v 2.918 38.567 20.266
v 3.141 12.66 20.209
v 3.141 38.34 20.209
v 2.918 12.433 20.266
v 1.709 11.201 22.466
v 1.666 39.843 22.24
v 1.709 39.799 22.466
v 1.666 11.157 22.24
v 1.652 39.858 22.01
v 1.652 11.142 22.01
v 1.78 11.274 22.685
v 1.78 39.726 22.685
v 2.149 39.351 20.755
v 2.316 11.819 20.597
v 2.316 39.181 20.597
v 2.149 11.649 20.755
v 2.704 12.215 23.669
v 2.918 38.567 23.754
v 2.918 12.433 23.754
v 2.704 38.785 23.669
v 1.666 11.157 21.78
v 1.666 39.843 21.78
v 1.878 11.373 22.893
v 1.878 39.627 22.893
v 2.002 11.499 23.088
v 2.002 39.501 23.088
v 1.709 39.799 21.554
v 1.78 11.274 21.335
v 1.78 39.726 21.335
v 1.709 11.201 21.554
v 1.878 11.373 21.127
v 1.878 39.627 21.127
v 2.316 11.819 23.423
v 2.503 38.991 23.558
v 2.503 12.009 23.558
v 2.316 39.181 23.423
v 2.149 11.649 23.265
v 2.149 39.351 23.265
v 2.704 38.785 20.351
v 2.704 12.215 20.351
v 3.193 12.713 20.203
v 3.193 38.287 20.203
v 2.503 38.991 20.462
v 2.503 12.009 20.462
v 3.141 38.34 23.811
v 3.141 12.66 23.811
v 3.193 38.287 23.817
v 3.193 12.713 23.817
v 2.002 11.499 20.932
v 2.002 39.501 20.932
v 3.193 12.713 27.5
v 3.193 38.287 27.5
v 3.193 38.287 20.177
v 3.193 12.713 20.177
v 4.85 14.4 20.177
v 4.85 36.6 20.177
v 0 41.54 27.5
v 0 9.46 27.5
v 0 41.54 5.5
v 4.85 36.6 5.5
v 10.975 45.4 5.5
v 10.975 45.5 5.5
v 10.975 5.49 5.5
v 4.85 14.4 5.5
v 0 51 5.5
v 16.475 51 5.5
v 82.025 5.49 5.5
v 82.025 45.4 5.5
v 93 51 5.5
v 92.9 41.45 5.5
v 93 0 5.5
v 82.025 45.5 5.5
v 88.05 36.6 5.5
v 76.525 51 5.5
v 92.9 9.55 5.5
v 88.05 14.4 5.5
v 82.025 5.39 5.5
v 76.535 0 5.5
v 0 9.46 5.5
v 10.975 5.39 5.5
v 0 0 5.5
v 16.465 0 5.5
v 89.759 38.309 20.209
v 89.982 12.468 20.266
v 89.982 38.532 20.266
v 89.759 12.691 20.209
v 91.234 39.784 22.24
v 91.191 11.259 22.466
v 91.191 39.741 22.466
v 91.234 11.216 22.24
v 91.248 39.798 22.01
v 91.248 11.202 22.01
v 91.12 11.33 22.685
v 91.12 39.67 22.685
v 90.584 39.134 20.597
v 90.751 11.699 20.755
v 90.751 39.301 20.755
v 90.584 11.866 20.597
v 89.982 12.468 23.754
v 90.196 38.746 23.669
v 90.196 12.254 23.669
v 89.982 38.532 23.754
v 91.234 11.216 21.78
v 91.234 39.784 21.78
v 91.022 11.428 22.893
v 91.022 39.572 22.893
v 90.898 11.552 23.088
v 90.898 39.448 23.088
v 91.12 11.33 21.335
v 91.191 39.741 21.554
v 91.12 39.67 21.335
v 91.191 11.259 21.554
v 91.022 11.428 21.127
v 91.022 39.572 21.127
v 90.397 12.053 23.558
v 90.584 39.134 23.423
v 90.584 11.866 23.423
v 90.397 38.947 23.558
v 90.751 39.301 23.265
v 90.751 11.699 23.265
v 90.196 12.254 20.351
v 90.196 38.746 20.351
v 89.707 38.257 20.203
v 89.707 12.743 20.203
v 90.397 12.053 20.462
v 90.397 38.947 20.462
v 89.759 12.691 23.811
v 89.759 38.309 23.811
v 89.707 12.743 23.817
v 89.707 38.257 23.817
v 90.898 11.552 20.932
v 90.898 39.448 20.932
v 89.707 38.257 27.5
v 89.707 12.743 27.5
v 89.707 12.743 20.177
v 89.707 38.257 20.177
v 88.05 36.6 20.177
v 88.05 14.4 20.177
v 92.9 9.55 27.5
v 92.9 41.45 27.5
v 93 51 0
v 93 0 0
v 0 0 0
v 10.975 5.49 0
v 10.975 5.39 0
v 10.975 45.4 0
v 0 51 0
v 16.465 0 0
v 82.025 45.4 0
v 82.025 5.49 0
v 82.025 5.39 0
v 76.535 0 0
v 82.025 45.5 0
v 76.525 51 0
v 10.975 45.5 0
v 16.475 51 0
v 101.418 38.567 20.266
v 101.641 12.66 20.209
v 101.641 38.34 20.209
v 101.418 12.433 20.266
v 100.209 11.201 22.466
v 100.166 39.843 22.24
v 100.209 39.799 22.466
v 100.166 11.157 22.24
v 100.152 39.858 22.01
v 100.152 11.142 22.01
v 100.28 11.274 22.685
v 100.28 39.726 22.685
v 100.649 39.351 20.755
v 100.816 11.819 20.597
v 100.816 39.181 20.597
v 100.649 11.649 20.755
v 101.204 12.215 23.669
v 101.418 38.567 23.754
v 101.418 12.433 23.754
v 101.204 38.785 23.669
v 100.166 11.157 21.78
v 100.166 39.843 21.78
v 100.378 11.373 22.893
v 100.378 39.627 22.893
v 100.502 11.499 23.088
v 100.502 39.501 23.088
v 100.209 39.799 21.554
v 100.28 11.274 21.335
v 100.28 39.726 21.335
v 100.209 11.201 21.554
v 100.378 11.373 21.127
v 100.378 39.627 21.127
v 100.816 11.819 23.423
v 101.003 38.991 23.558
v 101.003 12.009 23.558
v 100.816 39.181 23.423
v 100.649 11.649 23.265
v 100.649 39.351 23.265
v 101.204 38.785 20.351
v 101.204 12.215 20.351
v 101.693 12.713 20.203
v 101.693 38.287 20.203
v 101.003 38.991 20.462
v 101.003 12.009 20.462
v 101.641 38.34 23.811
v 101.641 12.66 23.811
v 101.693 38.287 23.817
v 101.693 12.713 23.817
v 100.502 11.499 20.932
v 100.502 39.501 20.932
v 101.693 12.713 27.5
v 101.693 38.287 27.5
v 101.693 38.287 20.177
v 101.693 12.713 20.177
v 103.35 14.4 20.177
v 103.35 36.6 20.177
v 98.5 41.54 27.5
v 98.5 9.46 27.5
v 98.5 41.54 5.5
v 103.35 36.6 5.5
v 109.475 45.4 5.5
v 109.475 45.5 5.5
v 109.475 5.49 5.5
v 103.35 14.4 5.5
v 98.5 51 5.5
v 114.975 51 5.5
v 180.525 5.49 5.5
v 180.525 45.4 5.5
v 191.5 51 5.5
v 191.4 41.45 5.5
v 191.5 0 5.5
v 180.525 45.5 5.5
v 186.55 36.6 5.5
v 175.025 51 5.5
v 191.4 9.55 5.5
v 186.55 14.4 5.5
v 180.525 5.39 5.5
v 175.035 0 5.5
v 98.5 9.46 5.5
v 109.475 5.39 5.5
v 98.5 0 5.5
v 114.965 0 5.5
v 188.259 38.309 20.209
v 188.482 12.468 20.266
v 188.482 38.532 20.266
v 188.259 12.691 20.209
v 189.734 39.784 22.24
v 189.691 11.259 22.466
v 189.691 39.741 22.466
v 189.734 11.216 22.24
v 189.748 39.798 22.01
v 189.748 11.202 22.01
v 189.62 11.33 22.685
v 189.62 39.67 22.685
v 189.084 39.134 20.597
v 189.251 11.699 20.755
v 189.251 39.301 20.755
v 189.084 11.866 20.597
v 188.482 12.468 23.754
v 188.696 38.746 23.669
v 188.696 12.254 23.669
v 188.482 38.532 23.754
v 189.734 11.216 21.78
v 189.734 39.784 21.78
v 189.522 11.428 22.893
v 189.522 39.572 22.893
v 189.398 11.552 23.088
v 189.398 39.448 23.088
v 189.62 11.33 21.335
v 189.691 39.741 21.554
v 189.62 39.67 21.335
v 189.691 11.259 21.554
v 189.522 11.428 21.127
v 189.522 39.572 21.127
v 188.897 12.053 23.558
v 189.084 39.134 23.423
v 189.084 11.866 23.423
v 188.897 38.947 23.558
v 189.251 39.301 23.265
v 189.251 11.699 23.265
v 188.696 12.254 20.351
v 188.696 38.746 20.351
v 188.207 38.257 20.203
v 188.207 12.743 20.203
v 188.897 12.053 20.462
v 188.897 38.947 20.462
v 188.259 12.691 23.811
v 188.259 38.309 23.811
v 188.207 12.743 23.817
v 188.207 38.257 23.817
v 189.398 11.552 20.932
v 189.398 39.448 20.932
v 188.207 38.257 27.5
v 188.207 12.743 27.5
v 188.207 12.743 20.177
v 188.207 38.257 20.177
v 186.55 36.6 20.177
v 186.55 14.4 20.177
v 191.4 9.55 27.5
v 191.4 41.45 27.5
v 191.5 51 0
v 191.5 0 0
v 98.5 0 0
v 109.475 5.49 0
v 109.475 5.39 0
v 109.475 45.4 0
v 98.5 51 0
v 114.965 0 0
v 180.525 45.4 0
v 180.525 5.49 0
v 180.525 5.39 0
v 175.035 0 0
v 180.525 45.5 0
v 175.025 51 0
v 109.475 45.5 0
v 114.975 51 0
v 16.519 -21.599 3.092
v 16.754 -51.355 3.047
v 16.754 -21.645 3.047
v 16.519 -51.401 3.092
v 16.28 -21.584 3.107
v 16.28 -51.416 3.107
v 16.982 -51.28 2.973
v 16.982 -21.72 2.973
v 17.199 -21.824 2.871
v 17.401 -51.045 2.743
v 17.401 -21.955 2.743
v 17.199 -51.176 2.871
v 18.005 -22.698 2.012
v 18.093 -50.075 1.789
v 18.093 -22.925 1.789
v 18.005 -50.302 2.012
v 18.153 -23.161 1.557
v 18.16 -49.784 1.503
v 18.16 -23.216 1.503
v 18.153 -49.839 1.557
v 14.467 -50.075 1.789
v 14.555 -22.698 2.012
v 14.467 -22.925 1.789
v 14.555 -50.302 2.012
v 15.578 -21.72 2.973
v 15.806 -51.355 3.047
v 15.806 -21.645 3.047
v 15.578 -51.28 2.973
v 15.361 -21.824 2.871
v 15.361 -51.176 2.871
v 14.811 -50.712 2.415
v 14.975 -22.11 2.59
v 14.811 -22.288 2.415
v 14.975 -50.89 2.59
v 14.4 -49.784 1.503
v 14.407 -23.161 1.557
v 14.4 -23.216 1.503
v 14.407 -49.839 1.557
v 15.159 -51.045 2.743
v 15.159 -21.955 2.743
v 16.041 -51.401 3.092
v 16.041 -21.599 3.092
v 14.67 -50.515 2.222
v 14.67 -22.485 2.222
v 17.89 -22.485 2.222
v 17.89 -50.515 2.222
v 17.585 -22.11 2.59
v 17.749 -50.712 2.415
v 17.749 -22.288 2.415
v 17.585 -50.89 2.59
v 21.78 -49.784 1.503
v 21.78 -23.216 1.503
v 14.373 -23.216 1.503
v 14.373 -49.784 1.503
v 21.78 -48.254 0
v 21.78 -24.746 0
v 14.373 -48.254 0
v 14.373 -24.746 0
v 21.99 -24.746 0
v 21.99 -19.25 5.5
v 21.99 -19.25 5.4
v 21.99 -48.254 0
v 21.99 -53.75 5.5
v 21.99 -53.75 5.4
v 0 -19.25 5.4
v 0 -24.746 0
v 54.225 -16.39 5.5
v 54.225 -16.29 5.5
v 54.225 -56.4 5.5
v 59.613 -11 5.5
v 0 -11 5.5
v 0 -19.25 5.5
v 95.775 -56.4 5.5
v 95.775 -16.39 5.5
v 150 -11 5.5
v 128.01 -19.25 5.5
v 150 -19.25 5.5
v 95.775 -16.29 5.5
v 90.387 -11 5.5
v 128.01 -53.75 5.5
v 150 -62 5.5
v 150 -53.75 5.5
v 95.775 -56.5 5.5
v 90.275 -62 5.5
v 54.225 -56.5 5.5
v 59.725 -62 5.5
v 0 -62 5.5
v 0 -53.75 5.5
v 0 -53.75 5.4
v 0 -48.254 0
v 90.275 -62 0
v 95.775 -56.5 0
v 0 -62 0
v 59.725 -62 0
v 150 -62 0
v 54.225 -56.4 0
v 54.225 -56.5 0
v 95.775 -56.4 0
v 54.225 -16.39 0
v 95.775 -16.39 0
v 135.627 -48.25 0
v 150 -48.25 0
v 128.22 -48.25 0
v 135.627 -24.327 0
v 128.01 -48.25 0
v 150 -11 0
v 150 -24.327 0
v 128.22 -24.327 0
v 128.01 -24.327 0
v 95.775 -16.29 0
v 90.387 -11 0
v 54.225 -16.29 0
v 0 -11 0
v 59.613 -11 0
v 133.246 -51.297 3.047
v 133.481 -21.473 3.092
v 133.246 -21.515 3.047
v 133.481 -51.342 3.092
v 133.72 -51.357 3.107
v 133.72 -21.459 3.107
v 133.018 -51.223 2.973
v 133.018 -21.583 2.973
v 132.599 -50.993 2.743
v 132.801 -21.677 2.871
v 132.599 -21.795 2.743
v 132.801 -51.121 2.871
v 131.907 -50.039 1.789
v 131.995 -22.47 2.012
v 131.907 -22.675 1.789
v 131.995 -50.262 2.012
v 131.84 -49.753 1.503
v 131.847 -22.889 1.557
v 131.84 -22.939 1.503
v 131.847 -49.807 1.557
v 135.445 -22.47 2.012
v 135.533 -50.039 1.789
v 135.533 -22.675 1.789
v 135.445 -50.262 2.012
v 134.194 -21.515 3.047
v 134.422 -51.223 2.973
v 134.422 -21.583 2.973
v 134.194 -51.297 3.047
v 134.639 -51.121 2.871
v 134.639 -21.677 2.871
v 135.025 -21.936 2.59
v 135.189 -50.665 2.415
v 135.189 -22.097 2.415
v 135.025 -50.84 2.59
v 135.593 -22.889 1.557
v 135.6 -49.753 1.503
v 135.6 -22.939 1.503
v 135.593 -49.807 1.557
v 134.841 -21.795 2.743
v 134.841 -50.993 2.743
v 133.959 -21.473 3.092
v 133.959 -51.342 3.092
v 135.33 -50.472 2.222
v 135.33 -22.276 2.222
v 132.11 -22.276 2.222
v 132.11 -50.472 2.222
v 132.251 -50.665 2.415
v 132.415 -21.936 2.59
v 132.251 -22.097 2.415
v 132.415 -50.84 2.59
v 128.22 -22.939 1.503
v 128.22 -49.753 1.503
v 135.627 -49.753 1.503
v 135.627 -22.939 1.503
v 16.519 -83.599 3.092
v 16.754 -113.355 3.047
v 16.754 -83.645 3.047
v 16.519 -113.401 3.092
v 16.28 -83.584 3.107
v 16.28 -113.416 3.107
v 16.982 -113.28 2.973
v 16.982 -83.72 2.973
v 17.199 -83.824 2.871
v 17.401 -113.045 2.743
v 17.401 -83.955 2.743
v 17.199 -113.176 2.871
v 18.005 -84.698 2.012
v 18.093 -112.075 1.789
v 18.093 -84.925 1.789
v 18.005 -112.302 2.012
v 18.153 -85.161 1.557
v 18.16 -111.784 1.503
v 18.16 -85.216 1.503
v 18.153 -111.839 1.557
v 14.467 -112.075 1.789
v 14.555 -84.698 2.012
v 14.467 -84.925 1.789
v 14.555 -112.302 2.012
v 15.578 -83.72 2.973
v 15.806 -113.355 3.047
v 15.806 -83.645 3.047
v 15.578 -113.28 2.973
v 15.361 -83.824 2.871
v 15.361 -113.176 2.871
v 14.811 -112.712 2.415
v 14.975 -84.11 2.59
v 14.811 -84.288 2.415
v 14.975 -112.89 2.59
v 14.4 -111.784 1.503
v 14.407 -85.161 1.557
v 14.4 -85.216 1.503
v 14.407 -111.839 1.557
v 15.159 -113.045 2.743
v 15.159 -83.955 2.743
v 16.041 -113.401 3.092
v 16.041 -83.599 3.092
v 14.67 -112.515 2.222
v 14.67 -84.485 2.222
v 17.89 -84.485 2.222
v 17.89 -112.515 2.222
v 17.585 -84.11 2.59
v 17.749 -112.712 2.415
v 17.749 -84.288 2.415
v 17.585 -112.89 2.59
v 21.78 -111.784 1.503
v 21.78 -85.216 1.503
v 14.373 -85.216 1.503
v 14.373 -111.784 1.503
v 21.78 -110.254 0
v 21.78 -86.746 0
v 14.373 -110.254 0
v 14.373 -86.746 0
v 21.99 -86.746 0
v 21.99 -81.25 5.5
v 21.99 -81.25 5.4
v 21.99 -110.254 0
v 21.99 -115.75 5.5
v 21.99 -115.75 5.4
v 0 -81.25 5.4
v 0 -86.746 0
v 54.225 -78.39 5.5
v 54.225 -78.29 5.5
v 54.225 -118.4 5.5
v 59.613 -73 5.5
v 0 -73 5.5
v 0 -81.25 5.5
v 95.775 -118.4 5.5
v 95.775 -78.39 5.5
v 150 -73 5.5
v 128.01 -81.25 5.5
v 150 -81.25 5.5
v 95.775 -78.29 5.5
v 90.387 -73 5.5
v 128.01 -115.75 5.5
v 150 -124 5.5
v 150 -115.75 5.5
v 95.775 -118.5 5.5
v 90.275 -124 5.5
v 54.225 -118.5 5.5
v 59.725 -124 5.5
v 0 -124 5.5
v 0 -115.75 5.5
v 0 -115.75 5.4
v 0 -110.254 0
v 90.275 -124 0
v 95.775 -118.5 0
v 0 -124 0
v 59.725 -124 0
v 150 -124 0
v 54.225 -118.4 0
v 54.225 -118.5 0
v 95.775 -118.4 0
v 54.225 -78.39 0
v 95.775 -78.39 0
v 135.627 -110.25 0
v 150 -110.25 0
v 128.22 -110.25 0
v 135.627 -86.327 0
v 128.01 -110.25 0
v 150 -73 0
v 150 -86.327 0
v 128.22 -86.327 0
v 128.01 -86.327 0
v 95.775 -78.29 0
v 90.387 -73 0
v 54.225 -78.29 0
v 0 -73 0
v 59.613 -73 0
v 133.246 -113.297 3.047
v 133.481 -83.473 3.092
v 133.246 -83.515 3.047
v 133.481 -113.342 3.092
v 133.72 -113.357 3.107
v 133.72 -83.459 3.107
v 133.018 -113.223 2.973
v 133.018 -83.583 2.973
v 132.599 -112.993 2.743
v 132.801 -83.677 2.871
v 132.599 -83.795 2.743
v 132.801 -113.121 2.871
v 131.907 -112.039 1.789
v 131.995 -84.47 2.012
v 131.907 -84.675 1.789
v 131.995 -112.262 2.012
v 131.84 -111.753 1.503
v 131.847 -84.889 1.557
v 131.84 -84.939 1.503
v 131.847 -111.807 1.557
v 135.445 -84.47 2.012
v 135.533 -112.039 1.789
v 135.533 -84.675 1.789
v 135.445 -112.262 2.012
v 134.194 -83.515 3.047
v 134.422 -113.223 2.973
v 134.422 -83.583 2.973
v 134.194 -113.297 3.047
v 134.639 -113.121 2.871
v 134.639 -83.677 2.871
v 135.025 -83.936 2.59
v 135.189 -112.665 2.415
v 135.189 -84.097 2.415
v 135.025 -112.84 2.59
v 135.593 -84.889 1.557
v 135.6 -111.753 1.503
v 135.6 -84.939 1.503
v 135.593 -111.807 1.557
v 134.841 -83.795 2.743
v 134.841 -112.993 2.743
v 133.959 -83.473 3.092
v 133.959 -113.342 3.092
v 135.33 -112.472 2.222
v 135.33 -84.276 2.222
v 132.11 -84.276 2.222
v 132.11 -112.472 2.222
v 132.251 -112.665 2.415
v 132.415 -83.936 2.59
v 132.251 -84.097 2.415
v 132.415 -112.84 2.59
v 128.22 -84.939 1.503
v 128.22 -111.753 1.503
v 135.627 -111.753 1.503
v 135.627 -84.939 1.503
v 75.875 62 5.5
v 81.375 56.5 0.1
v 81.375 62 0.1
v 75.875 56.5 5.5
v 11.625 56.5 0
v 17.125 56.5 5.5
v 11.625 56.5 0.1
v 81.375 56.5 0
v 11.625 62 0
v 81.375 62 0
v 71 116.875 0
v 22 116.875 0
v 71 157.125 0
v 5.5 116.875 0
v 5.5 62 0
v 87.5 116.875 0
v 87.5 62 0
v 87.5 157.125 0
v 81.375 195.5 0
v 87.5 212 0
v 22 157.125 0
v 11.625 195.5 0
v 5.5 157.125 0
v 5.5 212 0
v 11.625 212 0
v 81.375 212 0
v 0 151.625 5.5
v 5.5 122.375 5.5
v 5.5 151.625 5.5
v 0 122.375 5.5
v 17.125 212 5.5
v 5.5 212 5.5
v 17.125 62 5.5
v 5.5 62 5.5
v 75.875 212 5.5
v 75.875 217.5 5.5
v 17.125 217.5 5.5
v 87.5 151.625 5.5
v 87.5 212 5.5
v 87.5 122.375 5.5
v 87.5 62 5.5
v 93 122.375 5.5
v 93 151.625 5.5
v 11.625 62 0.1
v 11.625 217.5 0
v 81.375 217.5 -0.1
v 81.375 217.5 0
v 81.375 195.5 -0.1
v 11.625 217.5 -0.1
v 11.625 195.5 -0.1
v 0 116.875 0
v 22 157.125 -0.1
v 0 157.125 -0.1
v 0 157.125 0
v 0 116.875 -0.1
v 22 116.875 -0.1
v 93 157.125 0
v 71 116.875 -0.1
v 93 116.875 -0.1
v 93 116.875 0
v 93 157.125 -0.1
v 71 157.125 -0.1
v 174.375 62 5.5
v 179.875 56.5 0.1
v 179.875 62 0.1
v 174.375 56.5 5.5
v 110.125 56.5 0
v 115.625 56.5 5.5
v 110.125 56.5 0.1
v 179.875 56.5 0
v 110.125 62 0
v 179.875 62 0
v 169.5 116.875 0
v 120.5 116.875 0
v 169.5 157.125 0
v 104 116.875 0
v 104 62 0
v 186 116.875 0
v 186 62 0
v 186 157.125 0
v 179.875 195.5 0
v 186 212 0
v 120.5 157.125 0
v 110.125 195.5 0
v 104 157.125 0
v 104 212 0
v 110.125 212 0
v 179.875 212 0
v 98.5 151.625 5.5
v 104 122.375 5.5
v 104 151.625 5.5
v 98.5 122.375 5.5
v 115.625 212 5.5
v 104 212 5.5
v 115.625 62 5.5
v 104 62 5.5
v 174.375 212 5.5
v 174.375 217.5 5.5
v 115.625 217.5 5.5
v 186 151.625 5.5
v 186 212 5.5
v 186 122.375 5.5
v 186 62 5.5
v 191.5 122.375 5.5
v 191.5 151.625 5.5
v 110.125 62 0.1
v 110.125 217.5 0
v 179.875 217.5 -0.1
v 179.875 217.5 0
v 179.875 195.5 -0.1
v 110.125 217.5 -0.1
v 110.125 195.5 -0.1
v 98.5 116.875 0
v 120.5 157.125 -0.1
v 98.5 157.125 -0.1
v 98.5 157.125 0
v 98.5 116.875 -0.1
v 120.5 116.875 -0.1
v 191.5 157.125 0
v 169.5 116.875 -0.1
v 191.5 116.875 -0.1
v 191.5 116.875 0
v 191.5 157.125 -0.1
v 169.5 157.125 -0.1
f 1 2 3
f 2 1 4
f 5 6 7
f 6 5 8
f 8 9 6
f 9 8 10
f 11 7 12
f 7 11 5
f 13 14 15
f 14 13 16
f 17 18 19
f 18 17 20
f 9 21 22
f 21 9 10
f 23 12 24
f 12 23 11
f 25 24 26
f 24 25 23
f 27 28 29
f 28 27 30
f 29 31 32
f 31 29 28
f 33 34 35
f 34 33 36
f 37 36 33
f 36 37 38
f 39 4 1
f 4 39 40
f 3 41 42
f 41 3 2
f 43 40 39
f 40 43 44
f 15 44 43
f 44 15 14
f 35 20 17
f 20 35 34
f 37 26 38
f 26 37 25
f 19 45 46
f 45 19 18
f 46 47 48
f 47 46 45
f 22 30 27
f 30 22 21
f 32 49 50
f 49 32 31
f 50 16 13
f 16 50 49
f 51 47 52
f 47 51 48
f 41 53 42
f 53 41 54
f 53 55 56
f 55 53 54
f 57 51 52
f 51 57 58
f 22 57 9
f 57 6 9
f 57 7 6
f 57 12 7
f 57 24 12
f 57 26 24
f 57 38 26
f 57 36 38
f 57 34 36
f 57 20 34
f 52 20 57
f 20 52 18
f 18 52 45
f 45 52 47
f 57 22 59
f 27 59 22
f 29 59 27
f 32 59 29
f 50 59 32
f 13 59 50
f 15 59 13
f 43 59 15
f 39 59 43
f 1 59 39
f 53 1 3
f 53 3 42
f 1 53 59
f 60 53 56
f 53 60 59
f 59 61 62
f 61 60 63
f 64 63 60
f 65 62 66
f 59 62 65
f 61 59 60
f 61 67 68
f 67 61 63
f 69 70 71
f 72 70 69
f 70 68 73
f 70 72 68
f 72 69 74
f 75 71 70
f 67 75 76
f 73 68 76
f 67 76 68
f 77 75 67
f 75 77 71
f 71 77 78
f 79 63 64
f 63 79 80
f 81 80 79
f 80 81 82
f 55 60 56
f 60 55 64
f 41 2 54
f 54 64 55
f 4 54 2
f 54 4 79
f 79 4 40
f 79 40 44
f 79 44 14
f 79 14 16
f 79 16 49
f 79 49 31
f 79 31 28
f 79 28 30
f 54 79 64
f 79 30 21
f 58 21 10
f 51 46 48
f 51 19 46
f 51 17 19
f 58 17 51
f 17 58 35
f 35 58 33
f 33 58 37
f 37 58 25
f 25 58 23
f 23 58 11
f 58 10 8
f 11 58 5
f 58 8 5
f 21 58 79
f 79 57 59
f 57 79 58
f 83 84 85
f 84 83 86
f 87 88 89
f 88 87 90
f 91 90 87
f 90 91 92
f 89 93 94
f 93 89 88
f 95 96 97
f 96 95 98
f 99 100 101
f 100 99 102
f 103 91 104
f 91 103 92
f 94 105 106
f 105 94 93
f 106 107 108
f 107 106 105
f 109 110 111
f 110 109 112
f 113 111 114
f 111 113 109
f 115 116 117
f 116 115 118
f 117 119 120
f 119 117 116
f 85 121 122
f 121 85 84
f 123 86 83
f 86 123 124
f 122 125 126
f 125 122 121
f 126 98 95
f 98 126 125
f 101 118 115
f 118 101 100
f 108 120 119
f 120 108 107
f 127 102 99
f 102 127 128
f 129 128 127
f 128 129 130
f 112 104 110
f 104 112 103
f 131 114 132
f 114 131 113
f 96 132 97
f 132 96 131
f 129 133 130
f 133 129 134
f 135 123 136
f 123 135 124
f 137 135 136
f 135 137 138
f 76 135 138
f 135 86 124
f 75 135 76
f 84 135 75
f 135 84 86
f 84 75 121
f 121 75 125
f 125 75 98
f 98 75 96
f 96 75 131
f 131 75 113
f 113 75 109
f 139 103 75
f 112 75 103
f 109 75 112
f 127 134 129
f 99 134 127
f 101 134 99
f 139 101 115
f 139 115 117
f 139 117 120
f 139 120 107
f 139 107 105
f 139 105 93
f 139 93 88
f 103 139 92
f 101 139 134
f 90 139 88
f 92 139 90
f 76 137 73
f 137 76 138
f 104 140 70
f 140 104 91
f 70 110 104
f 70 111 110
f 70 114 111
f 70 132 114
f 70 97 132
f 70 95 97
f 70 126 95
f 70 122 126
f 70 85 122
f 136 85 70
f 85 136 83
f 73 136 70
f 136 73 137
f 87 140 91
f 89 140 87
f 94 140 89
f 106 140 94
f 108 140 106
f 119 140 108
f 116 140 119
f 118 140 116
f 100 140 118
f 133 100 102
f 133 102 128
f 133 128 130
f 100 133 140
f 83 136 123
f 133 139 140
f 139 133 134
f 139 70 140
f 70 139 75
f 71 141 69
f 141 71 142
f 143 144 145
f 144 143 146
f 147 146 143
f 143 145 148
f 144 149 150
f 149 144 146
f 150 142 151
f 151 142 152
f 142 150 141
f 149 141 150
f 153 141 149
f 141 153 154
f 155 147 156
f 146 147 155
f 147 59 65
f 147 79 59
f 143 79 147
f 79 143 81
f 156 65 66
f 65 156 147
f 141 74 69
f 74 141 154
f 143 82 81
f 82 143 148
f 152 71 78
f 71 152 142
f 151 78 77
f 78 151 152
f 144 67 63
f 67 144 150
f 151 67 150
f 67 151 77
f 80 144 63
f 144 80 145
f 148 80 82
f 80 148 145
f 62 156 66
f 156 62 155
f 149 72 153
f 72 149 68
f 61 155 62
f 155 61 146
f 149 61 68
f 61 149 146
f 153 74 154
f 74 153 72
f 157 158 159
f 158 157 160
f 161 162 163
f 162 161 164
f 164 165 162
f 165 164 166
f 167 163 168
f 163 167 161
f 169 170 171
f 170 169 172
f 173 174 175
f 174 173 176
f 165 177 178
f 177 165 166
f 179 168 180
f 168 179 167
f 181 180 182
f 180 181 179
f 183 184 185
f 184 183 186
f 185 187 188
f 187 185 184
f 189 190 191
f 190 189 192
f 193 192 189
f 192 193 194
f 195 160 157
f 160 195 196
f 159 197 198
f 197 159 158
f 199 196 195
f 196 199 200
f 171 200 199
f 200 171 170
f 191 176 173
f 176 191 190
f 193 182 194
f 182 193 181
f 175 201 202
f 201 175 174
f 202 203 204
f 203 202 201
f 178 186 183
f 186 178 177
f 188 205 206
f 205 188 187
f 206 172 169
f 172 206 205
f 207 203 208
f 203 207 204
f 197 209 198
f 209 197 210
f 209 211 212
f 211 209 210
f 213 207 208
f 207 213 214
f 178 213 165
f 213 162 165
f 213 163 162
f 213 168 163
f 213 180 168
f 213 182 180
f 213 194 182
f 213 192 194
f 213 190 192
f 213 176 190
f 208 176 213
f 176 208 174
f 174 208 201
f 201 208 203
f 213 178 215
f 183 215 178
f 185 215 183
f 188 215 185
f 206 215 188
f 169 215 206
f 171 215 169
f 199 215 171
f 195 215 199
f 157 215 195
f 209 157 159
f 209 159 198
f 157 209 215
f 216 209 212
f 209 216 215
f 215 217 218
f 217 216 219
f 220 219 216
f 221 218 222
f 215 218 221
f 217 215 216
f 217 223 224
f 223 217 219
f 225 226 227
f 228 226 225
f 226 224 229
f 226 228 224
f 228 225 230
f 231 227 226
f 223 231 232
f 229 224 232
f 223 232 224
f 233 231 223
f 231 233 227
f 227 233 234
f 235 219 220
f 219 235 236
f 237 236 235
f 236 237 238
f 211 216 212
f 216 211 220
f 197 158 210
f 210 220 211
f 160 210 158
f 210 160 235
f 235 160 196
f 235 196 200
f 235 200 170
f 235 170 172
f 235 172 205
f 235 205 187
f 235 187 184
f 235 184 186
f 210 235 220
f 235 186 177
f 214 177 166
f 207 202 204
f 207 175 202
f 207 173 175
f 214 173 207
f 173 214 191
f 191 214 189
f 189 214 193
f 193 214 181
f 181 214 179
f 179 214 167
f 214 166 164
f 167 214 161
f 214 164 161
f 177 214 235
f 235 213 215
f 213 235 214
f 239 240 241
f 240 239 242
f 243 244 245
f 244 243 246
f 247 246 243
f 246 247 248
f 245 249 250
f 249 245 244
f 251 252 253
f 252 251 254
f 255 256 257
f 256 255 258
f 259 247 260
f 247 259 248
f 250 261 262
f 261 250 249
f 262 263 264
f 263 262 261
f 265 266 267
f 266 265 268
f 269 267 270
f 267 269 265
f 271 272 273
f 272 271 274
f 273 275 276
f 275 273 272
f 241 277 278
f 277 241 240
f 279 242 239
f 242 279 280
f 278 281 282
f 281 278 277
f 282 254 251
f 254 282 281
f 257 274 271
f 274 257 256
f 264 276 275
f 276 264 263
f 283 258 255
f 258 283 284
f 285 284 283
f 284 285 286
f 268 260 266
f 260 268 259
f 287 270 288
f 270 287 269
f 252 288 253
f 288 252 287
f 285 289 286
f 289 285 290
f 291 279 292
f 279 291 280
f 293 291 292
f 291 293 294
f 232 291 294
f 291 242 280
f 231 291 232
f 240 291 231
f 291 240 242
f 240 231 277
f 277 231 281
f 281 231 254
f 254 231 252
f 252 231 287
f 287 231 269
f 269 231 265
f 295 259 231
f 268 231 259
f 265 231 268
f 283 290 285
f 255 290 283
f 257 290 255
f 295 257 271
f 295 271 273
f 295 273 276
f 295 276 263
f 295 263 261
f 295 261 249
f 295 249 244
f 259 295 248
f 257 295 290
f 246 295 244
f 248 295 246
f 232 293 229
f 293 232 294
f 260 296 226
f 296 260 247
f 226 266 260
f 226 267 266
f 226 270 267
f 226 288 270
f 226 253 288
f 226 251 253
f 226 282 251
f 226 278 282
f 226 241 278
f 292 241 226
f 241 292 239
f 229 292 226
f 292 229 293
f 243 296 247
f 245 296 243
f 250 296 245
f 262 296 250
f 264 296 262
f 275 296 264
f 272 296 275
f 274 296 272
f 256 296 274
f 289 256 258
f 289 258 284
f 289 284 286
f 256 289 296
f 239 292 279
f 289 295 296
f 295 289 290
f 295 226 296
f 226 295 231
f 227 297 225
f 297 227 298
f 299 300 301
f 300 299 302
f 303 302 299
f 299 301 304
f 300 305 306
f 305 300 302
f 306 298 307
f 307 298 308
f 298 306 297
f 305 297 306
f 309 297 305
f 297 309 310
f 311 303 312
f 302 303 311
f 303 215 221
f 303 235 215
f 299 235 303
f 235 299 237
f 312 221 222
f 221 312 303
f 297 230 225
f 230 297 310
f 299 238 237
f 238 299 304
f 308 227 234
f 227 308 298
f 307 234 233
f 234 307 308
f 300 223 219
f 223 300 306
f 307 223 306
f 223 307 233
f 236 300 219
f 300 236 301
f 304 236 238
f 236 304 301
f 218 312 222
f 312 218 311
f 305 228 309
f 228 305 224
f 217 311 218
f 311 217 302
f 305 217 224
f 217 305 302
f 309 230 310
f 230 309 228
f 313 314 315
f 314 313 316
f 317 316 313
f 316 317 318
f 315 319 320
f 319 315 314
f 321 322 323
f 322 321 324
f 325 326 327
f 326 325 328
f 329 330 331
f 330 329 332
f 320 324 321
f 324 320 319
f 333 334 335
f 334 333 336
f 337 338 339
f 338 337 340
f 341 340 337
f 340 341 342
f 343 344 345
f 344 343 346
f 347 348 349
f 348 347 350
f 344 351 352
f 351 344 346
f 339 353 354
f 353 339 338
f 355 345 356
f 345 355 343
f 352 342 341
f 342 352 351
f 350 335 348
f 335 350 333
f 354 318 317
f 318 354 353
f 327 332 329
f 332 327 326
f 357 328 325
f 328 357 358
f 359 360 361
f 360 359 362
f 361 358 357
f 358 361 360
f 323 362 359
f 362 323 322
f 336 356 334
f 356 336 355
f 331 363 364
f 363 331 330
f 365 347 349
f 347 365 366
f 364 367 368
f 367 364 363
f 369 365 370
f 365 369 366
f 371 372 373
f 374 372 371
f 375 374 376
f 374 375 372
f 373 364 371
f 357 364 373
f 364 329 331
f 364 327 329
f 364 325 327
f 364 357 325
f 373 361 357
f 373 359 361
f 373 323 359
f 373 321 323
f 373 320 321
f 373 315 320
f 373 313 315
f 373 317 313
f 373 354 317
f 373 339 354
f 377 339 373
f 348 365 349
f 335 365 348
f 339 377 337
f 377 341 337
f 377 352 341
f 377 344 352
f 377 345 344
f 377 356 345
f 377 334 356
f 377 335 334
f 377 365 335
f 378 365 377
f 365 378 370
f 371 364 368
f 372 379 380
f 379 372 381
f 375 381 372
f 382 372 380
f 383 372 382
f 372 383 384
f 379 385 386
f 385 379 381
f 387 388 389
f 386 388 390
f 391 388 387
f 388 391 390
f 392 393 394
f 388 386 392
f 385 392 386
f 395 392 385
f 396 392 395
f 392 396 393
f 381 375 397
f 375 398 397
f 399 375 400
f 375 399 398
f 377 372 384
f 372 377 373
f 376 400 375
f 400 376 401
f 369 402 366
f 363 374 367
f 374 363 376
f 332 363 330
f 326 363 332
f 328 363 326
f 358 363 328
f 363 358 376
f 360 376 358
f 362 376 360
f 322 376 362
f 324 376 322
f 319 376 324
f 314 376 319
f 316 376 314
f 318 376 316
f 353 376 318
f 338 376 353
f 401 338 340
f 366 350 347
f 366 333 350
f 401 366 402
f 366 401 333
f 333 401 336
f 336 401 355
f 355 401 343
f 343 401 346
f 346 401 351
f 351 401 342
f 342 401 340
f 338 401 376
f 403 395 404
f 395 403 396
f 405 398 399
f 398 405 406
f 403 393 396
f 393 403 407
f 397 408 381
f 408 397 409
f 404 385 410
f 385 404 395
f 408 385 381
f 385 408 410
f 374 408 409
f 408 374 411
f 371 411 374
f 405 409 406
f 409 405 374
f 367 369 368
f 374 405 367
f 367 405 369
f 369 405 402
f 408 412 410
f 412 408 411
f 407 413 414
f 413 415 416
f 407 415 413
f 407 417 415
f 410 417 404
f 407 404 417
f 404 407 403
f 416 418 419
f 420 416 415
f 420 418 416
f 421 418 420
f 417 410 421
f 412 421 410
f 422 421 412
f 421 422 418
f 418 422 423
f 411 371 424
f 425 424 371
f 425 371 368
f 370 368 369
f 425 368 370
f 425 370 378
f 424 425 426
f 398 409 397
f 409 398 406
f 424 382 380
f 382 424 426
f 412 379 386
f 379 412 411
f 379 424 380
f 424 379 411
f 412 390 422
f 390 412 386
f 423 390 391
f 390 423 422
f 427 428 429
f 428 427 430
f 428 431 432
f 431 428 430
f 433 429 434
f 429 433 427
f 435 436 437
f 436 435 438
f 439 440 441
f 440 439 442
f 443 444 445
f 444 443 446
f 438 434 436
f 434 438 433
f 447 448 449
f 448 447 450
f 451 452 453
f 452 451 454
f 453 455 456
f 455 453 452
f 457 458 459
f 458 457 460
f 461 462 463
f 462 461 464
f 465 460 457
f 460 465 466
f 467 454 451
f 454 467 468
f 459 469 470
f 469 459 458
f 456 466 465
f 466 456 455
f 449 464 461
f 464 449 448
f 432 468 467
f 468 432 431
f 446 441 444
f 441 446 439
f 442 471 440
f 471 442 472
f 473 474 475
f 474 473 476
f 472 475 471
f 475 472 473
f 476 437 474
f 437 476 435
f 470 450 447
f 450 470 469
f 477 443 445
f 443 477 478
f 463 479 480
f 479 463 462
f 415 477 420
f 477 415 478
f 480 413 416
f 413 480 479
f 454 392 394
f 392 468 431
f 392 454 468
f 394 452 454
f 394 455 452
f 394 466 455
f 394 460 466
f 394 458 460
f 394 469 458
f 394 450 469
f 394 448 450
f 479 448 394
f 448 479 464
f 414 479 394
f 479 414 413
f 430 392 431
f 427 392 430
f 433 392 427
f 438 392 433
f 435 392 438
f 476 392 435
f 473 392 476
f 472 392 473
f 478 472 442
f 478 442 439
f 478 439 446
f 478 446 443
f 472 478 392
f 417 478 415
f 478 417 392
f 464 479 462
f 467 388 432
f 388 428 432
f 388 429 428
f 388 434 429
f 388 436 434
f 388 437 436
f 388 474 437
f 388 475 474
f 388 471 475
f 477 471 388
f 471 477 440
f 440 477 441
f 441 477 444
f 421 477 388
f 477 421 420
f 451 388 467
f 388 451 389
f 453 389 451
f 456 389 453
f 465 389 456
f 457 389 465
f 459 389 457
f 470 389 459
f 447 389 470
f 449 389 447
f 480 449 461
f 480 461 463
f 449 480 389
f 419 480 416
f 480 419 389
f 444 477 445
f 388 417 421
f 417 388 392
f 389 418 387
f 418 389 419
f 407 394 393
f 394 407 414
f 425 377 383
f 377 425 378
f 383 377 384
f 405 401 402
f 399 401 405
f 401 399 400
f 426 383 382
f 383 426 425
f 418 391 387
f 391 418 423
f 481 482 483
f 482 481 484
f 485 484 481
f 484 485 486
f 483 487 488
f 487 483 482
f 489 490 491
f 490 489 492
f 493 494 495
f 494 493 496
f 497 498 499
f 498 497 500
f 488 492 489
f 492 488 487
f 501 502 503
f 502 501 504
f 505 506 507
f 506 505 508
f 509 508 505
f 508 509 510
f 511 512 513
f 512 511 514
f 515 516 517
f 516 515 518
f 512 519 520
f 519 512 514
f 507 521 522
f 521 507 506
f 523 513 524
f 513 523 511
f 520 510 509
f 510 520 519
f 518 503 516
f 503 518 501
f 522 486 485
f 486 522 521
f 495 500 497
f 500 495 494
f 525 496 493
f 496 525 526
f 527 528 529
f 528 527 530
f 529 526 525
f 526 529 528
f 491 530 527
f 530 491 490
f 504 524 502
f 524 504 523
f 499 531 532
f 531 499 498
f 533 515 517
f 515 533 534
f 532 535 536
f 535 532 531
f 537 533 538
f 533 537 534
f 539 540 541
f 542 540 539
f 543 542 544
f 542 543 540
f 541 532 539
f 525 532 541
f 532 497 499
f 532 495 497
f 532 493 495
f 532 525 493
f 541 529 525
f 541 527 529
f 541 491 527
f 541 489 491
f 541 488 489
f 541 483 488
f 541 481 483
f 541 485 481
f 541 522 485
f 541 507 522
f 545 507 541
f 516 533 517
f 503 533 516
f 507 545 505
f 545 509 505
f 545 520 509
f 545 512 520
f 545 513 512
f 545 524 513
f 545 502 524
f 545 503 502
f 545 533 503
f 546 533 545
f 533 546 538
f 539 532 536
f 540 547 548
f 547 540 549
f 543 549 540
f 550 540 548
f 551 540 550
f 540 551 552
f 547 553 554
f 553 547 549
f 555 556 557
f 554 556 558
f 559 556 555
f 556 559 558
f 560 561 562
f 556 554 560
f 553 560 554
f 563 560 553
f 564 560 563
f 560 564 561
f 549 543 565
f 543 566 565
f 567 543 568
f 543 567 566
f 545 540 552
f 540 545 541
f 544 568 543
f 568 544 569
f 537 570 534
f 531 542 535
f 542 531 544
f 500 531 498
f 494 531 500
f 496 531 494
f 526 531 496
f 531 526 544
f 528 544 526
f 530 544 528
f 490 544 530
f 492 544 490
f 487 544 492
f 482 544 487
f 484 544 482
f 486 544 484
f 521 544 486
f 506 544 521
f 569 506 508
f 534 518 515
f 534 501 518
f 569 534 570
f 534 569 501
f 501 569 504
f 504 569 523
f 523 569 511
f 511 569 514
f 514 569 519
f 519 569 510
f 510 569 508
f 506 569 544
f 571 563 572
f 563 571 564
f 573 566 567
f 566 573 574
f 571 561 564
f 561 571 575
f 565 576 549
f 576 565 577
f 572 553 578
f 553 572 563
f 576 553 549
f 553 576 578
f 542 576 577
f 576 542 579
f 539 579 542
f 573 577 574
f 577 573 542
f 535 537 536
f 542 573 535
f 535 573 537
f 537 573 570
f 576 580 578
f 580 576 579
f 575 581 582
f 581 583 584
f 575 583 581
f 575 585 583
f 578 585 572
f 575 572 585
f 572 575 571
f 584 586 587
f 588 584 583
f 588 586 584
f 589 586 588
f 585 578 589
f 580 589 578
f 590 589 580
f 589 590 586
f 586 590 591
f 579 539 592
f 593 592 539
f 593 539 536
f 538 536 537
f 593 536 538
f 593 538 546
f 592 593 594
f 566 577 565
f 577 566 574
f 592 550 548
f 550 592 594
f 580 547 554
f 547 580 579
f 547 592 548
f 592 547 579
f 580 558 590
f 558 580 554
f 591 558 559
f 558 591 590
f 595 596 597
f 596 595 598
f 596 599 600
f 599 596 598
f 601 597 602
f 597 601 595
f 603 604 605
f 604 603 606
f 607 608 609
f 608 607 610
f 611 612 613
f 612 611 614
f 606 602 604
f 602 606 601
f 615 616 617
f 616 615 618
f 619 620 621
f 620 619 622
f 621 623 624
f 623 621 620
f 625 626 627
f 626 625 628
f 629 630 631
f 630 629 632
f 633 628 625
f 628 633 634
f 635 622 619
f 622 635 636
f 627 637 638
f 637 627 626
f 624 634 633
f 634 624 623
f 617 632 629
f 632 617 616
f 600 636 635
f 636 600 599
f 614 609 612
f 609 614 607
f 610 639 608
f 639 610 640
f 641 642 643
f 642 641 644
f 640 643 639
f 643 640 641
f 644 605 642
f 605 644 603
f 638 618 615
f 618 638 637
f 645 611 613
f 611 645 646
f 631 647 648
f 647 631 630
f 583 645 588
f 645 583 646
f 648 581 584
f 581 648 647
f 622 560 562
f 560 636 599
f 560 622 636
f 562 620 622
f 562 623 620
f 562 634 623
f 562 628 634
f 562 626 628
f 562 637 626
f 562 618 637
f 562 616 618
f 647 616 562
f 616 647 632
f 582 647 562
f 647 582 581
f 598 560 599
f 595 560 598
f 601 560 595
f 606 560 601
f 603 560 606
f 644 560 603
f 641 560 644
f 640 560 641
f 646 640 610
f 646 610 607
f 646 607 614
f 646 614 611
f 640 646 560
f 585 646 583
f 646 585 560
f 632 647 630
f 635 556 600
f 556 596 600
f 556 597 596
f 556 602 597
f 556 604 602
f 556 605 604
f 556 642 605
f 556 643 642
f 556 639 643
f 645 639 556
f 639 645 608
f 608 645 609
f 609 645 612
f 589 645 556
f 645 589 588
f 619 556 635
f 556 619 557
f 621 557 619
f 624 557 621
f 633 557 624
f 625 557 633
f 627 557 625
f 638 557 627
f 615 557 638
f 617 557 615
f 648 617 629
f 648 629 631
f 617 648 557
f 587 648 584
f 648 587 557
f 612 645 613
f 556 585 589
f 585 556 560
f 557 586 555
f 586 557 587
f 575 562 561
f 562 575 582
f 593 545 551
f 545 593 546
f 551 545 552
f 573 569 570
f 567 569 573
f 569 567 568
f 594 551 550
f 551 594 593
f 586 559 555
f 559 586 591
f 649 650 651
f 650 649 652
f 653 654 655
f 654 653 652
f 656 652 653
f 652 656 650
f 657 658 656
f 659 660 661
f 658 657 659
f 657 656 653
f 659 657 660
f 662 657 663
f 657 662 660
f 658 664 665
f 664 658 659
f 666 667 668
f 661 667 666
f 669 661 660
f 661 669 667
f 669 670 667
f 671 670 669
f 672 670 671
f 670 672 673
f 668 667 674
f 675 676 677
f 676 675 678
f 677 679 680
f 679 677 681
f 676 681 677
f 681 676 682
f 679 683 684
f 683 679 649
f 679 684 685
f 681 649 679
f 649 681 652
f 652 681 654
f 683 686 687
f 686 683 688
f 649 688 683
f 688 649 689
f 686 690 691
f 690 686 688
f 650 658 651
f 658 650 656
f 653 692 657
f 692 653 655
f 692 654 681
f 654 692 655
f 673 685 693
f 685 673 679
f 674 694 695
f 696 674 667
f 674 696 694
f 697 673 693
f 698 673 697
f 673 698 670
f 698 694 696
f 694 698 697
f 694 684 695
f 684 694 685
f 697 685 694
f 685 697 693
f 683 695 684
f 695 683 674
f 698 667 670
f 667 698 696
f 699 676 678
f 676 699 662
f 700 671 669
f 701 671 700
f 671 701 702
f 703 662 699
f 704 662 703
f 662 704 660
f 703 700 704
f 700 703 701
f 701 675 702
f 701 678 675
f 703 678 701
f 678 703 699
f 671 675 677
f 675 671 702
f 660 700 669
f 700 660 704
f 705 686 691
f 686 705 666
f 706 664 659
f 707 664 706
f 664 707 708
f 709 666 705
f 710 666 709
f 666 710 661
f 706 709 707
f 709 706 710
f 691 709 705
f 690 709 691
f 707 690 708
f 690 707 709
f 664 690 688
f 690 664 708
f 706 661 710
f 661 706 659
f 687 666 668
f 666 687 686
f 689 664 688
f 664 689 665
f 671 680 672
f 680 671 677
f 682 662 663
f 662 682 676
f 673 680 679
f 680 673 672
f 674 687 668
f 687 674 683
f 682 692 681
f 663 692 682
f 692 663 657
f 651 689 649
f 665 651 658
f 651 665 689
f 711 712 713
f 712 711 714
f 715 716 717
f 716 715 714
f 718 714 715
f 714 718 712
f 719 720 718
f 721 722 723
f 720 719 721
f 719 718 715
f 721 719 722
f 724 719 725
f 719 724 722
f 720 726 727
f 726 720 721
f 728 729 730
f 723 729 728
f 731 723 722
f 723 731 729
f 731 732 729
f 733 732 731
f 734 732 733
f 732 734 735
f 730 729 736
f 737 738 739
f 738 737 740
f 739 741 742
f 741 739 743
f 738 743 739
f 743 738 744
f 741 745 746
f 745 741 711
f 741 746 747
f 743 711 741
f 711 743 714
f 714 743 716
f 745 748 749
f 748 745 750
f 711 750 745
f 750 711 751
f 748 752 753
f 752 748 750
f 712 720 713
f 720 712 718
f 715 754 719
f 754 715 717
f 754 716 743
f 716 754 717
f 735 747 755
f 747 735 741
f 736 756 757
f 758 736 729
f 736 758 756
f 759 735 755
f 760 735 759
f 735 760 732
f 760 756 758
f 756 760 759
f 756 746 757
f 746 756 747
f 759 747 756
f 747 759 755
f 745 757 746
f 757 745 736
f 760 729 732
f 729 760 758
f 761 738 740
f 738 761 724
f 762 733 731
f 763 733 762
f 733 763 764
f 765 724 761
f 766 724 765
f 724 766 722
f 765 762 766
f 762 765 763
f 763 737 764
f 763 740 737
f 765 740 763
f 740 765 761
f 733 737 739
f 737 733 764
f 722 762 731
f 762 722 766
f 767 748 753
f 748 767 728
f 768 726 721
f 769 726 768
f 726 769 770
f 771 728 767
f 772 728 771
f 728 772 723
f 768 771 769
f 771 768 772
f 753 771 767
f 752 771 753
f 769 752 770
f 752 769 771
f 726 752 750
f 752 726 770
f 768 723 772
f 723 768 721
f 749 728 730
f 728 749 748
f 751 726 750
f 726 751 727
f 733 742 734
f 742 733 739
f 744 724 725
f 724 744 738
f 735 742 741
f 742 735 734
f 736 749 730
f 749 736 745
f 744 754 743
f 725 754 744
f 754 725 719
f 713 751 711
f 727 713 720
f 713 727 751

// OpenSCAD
// Which one would you like to print?
part = "all"; // [top:Top or Bottom,side:Side,front:Front or Back,all:All Pieces]

// How thick are the walls of the box? Snaps don't work well if the walls are too thin.
wall_thickness=5.5;

box_length=150;
box_height=40;
box_width=82;

t=wall_thickness;

// How much smaller are the dovetails than the slots?
tolerance=1.3;


tt=t+t;


length=box_length+tt;
height=box_height+tt;
width=box_width+tt;

longTabLength=t*4;


module clip(height, t) {
  $fn=50;
  union() {
    cylinder(r=t/3, h=height);
    translate([-t/4, -t/3, 0])
    cube([t/3.3, longTabLength/4 + t/3, height]);
  }
}

module innerSlotLeft(height, t, cut) {
  difference() {
    hull() {
      cube([0.1, height, longTabLength]);
      translate([t-0.1, t, 0])
        cube([0.1, height-t-t, longTabLength]);
    }
    translate([t/4*3+0.01, 0, longTabLength-t+0.01])
      rotate([-90, 180, 0])
      union() {
      clip(height, t);
    }
  }
}

module innerSlotRight(height, t) {
  difference() {
    hull() {
      cube([0.1, height, longTabLength]);
      translate([-t, t, 0])
        cube([0.1, height-tt, longTabLength]);
    }
    translate([-t/4*3-0.01, height, longTabLength-t+0.01])
      rotate([-90, 180, 180])
      union() {
      clip(height, t);
    }
  }
}

module front(length, width, height, t) {
  difference() {
    union() {
      cube([width, height, t]);
      
      translate([-tolerance/2, 3/2*t+tolerance/2, t])
        difference() {
        innerSlotLeft(height-t*3-tolerance, t);
        translate([-t+tolerance/2, 0, 0])
        cube([t, height, height-t-3-tolerance]);
        }
    
      translate([width-0.1+tolerance/2, t*3/2+tolerance/2, t])
        difference() {
        innerSlotRight(height-t*3-tolerance, t);
        translate([-tolerance/2, 0, 0])
        cube([t, height, height-t-3-tolerance]);
        }
    }
    
    translate([(width-width*0.75-tolerance)/2, t-0.01, 0])
      rotate([0, 0, -90])
      innerSlotLeft(width*0.75+tolerance, t);

    translate([(width-width*0.75-tolerance)/2, height-t, 0])
      rotate([0, 0, -90])
      innerSlotRight(width*0.75+tolerance, t);
  }
  
}

module side(length, width, height, t) {
  length=length-t-t;
  difference() {
    cube([length, height, t]);

    translate([-0.01, t*3/2, t])
    rotate([0, 90, 0])
      innerSlotLeft(height-t*3, t*1.04);

    rotate([0, 0, 90])
      translate([t, -length/2-(length+tt)*0.25/2 - tolerance/2, 0])
      innerSlotRight((length+tt)*0.25+tolerance, t);

    rotate([0, 0, 90])
      translate([height-t*0.98, -length/2-(length+tt)*0.25/2 - tolerance/2, 0])
      innerSlotLeft((length+tt)*0.25+tolerance, t);


    translate([length+0.01,(t*3/2), t*1.0])
    rotate([180, 0, 0])
    rotate([0, 90, 180])
      innerSlotRight(height-t*3, t*1.04);
    }
  
}

module top(length, width, height, t) {
  length=length-t-t;
  width=width-t-t;

    union() {
      cube([width, length, t]);
      
      translate([((width)-(width+tt)*0.75)/2, -t, 0])
        rotate([0, -90, -90])
        innerSlotLeft((width+tt)*0.75, t);
      
      translate([((width)-(width+tt)*0.75)/2, t+length, 0]) //magic numbers are yucky
        rotate([0, 90, -90])
        innerSlotRight((width+tt)*0.75, t);

      rotate([0, 90, 0])
        translate([0, length/2-(length+tt)*0.25/2, -t])
        innerSlotRight((length+tt)*0.25, t);

      rotate([0, 90, 180])
        translate([0, -length/2-(length+tt)*0.25/2, -width-t])
        innerSlotRight((length+tt)*0.25, t);
  }
  
}

if (part == "all") {
  front(length, width, height, t);

  translate([width+t, 0, 0])
    front(length, width, height, t);

  translate([0, -height-t*2, 0])
    side(length, width, height, t);

  translate([0, -height*2-t*2*2, 0])
    side(length, width, height, t);

  translate([t, height+t*2, 0])
    top(length, width, height, t);

  translate([width+t*2, height+t*2, 0])
    top(length, width, height, t);
} else if (part == "top") {
  top(length, width, height, t);
} else if (part == "side") {
  side(length, width, height, t);
} else if (part == "front") {
  front(length, width, height, t);
}
